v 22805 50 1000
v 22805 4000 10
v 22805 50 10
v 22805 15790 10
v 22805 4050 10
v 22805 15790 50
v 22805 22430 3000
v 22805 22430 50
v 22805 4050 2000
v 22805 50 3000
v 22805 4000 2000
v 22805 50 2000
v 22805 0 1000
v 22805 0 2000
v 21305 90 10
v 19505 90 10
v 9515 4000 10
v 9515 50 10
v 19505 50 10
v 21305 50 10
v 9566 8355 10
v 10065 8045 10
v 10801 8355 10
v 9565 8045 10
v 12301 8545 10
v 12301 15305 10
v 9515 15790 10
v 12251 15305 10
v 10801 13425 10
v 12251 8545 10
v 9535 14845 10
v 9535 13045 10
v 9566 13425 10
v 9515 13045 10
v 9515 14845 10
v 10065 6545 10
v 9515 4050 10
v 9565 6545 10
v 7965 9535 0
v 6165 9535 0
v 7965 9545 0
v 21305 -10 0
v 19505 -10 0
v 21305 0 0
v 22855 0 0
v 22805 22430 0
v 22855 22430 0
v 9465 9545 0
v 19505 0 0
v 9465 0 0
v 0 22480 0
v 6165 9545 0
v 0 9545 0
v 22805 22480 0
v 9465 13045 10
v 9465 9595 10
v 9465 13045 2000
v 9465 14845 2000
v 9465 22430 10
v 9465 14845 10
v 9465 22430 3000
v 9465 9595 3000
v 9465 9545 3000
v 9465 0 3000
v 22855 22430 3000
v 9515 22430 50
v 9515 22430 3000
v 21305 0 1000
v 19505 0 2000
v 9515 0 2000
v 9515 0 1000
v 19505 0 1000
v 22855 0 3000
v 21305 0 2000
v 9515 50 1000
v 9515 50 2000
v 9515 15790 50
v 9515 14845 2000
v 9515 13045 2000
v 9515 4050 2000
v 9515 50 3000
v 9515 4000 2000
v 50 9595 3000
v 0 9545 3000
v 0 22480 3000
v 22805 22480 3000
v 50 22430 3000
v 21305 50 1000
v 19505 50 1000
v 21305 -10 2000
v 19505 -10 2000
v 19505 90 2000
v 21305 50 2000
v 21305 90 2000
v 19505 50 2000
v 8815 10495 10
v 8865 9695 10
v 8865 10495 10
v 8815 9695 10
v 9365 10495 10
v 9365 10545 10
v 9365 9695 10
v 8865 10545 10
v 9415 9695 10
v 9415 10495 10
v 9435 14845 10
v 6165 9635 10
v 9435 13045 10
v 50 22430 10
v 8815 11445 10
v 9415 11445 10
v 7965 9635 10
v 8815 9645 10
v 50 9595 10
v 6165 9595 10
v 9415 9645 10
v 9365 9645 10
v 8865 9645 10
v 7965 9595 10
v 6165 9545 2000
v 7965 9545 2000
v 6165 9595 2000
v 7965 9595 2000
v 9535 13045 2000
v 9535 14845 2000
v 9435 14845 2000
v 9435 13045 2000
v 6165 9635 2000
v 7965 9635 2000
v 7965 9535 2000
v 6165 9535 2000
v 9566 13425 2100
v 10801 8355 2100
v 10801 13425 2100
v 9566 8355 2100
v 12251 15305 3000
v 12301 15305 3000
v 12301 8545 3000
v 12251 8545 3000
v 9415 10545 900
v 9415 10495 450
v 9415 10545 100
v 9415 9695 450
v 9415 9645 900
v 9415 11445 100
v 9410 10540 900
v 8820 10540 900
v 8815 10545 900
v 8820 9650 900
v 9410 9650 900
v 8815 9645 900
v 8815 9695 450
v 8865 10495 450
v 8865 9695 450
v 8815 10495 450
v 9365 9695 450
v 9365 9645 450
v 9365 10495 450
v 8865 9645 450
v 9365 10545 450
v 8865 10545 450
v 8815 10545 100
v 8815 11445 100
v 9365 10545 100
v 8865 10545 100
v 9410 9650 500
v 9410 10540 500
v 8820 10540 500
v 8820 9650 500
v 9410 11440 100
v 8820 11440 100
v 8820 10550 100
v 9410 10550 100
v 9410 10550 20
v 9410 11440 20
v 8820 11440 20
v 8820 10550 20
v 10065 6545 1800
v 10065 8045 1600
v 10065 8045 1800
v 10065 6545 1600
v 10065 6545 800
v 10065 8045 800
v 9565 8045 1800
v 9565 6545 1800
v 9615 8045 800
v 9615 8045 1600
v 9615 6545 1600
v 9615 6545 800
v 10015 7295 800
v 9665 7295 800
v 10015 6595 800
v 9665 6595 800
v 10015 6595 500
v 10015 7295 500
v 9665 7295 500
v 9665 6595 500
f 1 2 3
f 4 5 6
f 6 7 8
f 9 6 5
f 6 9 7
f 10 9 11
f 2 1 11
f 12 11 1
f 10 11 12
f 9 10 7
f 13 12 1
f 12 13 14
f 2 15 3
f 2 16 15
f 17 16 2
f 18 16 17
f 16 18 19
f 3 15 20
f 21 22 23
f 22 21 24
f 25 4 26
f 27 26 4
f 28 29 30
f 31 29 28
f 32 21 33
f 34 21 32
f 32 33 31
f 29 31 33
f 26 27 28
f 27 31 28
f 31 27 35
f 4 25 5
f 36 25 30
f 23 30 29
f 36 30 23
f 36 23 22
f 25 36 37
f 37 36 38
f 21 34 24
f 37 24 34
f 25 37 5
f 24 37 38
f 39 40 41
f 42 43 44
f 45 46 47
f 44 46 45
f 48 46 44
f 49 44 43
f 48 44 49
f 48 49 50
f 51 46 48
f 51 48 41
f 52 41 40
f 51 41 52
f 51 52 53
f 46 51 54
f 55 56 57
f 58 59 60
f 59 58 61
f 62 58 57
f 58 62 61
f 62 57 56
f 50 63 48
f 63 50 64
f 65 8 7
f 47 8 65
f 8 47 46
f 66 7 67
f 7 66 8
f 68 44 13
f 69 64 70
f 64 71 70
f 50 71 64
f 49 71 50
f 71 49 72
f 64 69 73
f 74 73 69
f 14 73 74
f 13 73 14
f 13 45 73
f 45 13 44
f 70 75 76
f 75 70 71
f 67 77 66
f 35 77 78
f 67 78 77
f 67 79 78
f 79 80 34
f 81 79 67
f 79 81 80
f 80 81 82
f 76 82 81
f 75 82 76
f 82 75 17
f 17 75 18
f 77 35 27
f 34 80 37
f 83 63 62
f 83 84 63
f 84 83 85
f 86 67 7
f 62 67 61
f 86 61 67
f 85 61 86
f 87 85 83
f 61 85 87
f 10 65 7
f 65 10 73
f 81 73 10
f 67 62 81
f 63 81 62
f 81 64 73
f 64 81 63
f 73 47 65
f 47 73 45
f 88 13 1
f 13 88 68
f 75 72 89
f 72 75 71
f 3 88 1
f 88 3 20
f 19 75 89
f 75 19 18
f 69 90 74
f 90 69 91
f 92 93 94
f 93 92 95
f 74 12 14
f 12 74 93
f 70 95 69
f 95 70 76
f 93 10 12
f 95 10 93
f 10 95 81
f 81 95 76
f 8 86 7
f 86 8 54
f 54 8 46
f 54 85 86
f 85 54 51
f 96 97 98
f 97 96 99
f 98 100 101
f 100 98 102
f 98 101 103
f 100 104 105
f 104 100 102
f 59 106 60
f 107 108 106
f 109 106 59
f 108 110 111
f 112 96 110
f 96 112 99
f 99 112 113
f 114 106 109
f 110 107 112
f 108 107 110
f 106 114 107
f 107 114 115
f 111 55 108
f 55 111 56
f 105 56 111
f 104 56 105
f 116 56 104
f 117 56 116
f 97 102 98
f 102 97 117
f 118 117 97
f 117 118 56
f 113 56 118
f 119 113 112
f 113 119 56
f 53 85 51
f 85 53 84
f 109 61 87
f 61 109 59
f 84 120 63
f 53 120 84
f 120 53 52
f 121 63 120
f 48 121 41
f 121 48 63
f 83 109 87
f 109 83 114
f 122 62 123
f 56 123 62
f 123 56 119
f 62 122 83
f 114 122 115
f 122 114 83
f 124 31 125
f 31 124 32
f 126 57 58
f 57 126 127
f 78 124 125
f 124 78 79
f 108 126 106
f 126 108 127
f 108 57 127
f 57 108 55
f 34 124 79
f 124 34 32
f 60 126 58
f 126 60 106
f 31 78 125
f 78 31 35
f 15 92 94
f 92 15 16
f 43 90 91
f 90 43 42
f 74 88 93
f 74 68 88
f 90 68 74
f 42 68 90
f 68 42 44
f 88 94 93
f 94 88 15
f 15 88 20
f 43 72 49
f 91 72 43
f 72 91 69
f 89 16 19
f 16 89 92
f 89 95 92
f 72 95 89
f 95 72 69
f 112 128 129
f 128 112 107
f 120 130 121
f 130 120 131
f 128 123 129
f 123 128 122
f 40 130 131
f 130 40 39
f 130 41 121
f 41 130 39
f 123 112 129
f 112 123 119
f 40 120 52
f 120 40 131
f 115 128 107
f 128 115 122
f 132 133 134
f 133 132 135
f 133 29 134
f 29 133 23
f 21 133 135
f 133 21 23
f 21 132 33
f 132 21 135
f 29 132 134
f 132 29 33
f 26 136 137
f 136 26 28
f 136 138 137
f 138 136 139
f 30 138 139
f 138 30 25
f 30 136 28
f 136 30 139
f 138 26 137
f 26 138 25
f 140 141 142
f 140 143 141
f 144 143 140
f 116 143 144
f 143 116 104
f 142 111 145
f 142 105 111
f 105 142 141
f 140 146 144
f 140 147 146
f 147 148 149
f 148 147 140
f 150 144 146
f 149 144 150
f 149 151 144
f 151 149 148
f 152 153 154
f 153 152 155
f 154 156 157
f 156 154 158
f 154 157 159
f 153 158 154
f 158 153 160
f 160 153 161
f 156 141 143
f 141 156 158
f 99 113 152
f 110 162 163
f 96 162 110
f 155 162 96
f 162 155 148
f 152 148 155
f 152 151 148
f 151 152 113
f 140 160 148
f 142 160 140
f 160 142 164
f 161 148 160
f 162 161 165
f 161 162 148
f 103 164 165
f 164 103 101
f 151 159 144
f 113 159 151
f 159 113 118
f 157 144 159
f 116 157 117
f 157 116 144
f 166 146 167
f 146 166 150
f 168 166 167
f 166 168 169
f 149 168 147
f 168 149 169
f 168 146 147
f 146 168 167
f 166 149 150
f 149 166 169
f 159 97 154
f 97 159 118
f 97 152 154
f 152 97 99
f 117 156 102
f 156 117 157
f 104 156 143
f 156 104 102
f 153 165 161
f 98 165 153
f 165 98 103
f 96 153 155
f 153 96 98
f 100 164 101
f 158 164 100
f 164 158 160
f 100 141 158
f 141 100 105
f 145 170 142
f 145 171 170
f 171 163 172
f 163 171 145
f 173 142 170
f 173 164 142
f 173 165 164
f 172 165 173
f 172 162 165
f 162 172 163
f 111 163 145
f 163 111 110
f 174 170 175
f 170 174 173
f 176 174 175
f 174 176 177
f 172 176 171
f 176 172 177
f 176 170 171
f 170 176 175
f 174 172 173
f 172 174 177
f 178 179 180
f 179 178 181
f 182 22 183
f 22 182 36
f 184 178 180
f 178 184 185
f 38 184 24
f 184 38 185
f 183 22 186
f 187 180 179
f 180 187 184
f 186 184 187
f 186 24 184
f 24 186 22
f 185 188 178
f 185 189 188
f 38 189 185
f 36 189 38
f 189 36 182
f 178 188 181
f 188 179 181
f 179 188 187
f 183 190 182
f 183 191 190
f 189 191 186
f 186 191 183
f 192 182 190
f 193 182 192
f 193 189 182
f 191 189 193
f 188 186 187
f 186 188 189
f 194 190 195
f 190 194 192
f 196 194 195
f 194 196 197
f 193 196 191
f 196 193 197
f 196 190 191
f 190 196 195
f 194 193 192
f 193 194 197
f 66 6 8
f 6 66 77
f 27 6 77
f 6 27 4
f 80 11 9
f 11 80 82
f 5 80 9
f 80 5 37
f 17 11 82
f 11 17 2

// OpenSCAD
//
// ver 2
//


//toilet size
tx = 1235;
ty = 1690;
//souko size
sx = 9465;
sy = 12885;
//jimsho size
jx = 13340;
jy = 2140+13650+6640; 
jz = 3000;
//diff
dy = jy-sy;
//
//
//
translate([9465, 0,0]) big_building(jx, jy, jz);
translate([0,2140+13650+6640-12885,0])souko(sx, sy, 3000);

translate ([sx-30, dy+3500, 0]) both_door();
translate ([sx+jx-1500, -10, 0]) rotate([0,0, 90]) both_door();
translate ([sx-1500, dy-10, 0]) rotate([0,0, 90]) both_door();

translate([sx+1236+100, dy+500, 0])rotate([0,0,90]) toilet_space_yoko(sx, dy);

translate([sx, jy-6640, 0])color("black")cube([jx, 6640, 50]);
//間仕切
translate([sx, 4000,0]) color("white")cube([jx, 50, jz-1000]);
translate([sx-650, dy+100, 0])sink_area();
translate([sx+100, dy-3000,0]) mini_kichen();


module big_building(x, y, h){
  cube([x, y, 10]);
  cube([50, y, h]);
  translate([x, 0, 0])cube([50, y, h]);
  translate([0, 0, 0])cube([x, 50, h/3]);
  translate([0, 0, h*2/3])cube([x, 50, h/3]);
  translate([0, y, 0])cube([x, 50, h]);
}

module souko(x, y, h){
  cube([x, y, 10]);
  translate([0, 0, 0])cube([50, y, h]);
  translate([0, 0, 0])cube([x, 50, h]);
  translate([0, y, 0])cube([x, 50, h]);
}

module toilet(){
  color("white") cube([1235, 1690, 2100]);
}

module both_door(){
  color("silver"){
    cube([100, 900, 2000]);
    translate([0, 900, 0])cube([100,900,2000]);
  }
}

module toilet_space_yoko(x, y){
  translate([0, 0, 0]) rotate([0,0,90])toilet();
  translate([1690, 0, 0]) rotate([0,0,90])toilet();
  translate([1690*2, 0, 0]) rotate([0,0,90])toilet();

  translate([-1500, -1500, 0]) cube([1690*4, 50,3000]);
}

module toilet_space_tate(sx){
  translate([sx, 0,0]) toilet();
  translate([sx+tx, 0,0]) toilet();
  translate([sx+tx*2, 0,0]) toilet();
}

module sink_area(){
  color("silver"){
  //sink 
  //translate([0,900,0])
  union(){
  translate([0,0,450])
  difference(){
    translate([0,0,0]) cube([600, 900, 450]);
    translate([5,5,50]) cube([590, 890, 450]);
  }
  for(i=[0:850:900]){
    translate([0, i, 0]) cube([50,50,450]);
    translate([550, i, 0]) cube([50,50,450]);
  }
  }
  //pan
  translate([0,900,0])
  difference(){
    translate([0,0,0]) cube([600, 900, 100]);
    translate([5,5,20]) cube([590, 890, 100]);
  }
  }
}

module mini_kichen(){
  color("silver"){
    difference(){
      cube([500, 1500, 1800]);
      translate([50, -50, 800]) cube([500, 1600, 800]);
      translate([100, 50, 500]) cube([350, 700, 350]);
    }
  }
}

module locker_toilet(){
  cube([1850, 3650, 2625]);
}
